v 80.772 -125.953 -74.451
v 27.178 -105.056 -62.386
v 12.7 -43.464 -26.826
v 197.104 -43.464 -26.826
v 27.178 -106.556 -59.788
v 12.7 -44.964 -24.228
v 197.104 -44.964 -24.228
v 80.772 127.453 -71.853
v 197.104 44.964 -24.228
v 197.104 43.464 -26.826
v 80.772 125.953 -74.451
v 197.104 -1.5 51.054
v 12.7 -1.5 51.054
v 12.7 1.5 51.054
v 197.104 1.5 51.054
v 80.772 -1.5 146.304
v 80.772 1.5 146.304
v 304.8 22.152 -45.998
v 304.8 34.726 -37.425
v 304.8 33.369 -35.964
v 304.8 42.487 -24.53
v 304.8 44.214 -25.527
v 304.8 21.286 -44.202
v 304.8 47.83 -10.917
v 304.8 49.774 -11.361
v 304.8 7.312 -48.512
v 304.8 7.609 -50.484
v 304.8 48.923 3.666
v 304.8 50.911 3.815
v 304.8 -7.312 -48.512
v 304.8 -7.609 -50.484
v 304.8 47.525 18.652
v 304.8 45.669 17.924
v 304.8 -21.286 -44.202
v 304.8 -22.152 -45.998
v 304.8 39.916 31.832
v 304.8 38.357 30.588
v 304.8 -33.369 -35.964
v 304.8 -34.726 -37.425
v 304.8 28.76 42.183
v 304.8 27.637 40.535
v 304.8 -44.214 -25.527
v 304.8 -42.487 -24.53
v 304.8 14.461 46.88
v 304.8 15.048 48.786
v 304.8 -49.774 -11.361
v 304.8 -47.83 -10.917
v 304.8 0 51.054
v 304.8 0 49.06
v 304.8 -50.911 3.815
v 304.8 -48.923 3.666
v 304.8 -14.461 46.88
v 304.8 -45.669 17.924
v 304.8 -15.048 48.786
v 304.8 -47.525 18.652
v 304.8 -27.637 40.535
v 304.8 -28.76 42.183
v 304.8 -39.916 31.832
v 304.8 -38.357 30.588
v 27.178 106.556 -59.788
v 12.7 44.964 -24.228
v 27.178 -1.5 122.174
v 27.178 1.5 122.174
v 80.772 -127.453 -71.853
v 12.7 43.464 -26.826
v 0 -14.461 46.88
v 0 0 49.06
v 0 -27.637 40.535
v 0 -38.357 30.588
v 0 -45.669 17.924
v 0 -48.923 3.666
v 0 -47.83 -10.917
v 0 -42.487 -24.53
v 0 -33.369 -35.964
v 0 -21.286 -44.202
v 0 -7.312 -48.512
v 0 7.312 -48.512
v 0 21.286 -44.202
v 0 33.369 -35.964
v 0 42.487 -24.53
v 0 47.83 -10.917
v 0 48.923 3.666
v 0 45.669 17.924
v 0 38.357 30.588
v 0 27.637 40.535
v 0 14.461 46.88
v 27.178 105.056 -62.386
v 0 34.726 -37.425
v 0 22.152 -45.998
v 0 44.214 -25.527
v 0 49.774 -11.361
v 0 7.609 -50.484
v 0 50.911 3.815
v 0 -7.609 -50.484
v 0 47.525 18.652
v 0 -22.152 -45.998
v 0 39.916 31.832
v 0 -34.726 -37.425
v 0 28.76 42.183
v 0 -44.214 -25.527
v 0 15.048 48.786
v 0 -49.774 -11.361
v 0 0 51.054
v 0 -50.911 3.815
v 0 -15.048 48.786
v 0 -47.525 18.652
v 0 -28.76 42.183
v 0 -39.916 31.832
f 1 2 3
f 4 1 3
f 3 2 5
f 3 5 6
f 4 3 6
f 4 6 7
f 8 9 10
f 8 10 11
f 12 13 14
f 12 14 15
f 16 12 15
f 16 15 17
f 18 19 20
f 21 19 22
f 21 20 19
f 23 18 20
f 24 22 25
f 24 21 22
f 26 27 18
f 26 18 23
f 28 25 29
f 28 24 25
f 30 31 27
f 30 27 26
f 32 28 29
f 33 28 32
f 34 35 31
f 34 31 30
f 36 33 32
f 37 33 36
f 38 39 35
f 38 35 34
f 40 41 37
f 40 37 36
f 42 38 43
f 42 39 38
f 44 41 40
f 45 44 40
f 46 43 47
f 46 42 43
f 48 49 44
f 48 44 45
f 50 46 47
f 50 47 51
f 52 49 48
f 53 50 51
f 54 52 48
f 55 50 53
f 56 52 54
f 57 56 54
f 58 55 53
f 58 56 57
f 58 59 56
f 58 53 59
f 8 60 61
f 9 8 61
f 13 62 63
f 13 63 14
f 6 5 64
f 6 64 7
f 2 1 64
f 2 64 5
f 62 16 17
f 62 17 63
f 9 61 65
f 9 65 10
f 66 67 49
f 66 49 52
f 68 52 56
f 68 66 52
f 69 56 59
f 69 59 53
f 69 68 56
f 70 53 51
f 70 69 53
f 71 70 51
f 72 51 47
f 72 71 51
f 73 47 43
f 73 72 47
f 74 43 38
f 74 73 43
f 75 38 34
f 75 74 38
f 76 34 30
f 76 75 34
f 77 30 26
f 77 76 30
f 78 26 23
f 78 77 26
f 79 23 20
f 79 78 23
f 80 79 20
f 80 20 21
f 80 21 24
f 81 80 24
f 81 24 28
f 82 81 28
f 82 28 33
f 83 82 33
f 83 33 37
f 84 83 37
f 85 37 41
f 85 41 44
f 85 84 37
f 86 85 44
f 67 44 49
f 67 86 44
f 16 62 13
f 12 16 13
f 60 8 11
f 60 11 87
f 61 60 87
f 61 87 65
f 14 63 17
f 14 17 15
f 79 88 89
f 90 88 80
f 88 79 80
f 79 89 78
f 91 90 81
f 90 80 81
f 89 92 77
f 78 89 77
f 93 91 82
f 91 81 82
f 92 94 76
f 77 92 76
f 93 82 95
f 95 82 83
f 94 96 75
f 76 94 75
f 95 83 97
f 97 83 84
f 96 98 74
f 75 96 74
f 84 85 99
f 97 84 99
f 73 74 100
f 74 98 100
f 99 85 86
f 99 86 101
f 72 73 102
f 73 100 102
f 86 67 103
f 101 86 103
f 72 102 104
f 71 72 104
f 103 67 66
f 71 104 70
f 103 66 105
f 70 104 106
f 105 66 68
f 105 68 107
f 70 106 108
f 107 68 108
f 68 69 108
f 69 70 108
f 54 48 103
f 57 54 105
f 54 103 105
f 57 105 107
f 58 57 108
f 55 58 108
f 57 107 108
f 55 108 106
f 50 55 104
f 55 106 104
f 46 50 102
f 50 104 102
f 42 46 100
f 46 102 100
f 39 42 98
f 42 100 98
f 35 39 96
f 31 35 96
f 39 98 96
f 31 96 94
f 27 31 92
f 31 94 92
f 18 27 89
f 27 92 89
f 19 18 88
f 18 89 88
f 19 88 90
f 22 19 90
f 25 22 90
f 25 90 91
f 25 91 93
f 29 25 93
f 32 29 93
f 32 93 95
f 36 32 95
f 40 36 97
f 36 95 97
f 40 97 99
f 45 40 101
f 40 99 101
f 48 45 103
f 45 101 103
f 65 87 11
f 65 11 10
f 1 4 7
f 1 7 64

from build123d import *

# Parameters (mm, degrees)
BODY_TUBE_R              = 51.054
BODY_TUBE_R_2            = 49.0601
BOSS_EXTRUDE1_DEPTH      = 304.8
BOSS_EXTRUDE3_DEPTH      = 1.5
BOSS_EXTRUDE3_DEPTH_BACK = 1.5
CIRPATTERN10_COUNT       = 3


with BuildPart() as part:
    # Body Tube → Boss-Extrude1 (new body)
    with BuildSketch(Plane.YZ):
        Circle(BODY_TUBE_R)
        Circle(BODY_TUBE_R_2, mode=Mode.SUBTRACT)
    extrude(amount=BOSS_EXTRUDE1_DEPTH)


with BuildPart() as body_2:
    # Sketch6 → Boss-Extrude3 (new, two sides: drawn at the far end of the back side and taken through both)
    with BuildSketch(Plane(origin=(0, 0, 0), x_dir=(-1, 0, 0), z_dir=(0, 1, 0)).offset(-BOSS_EXTRUDE3_DEPTH_BACK)):
        Polygon((-12.7, 51.054), (-197.104, 51.054), (-80.772, 146.304), (-27.178, 122.174), align=None)
    extrude(amount=BOSS_EXTRUDE3_DEPTH + BOSS_EXTRUDE3_DEPTH_BACK)


with BuildPart() as cirpattern10_1:
    # CirPattern10: pattern copy
    add(body_2.part.rotate(Axis((304.8, 0, 0), (-1, 0, 0)), 1 * 360 / CIRPATTERN10_COUNT))


with BuildPart() as cirpattern10_2:
    # CirPattern10: pattern copy
    add(body_2.part.rotate(Axis((304.8, 0, 0), (-1, 0, 0)), 2 * 360 / CIRPATTERN10_COUNT))


solid = Compound([part.part, body_2.part, cirpattern10_1.part, cirpattern10_2.part])
